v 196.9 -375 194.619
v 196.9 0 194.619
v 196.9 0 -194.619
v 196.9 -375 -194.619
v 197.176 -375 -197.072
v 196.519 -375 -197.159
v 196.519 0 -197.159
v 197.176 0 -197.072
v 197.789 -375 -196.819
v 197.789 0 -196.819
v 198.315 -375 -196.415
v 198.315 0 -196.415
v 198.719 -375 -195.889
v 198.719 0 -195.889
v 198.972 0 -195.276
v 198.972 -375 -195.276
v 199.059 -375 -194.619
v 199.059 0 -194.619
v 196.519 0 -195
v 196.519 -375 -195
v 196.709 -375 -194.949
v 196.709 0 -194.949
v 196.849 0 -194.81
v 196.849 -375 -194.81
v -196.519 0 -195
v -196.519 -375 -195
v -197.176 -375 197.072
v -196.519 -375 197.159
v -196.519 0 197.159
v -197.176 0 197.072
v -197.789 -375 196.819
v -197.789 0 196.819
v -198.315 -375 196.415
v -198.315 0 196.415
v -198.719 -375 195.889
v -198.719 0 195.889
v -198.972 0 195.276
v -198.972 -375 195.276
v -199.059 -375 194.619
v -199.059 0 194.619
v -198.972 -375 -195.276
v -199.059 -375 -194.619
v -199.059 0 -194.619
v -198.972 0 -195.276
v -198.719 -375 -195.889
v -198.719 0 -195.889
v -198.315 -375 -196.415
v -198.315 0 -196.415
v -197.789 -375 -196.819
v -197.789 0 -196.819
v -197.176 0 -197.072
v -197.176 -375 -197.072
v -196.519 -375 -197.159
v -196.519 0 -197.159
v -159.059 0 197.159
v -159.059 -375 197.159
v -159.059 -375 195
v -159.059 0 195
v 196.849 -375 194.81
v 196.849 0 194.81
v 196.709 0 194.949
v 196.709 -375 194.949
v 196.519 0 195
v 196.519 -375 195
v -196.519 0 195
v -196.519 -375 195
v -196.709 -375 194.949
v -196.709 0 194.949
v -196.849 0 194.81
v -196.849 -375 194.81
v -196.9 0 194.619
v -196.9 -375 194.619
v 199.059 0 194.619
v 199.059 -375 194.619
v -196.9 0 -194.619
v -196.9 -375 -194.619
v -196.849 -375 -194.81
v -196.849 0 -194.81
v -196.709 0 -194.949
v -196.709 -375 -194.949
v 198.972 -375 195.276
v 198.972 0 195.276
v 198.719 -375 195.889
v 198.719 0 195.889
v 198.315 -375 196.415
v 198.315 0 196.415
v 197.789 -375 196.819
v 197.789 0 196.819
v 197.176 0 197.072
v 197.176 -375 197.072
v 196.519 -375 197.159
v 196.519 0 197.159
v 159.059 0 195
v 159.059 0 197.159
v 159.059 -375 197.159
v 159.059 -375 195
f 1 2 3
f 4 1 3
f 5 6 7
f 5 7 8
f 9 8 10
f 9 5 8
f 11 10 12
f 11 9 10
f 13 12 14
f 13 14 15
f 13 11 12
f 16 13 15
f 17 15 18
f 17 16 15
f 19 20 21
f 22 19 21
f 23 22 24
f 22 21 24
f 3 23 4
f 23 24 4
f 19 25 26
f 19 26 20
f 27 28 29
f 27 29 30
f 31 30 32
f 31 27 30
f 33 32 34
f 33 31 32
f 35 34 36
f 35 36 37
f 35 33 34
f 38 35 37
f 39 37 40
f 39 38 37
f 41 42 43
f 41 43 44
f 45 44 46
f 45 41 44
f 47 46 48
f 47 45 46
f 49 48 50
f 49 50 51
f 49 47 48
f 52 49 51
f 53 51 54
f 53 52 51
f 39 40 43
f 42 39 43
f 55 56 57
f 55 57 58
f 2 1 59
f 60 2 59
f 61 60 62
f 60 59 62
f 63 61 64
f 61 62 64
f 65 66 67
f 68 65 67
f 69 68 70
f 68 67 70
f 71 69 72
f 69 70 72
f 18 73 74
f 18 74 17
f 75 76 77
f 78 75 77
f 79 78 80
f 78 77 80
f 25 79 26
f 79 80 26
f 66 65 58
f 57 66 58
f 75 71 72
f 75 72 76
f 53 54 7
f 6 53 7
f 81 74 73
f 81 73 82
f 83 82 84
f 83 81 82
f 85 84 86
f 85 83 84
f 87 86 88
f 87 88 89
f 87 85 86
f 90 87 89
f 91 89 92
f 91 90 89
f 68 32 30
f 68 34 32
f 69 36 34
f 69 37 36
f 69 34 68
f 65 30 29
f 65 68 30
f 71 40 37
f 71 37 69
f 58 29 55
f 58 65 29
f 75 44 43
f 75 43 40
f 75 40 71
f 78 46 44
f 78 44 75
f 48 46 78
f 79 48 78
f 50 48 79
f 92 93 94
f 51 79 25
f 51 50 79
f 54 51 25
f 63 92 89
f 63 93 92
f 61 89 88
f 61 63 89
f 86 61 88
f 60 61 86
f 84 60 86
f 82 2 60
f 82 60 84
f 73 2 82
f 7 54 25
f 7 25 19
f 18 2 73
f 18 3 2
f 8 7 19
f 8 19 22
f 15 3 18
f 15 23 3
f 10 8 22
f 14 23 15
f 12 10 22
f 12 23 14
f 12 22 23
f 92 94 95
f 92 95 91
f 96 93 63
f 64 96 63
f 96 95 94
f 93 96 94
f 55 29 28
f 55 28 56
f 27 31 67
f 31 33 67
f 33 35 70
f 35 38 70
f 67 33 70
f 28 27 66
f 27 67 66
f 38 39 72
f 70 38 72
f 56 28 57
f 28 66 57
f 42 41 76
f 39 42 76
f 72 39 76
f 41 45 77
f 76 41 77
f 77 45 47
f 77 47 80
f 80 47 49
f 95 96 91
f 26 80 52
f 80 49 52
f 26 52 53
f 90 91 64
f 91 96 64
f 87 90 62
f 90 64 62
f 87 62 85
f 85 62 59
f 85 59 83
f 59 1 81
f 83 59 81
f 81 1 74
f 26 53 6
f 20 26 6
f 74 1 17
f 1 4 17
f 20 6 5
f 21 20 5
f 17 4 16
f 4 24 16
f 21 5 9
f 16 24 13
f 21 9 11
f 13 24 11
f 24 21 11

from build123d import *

# Parameters (mm, degrees)
SKETCH1_W              = 398.11784
SKETCH1_H              = 394.318
SKETCH1_W_2            = 393.79984
SKETCH1_H_2            = 390
EXTRUDE_THIN1_DEPTH    = 375
CUT_EXTRUDE1_REACH     = 581.427
SKETCH2_W              = 318.11784
SKETCH2_H              = 375
CONVERT_SOLID1_START   = -375
CONVERT_SOLID1_DEPTH   = 375
CONVERT_SOLID1_2_DEPTH = 375


# Read off the part's stored shape, not the designer's step: Convert-Solid1
with BuildPart() as part:
    # Sketch1 → Extrude-Thin1 (new body)
    with BuildSketch(Plane(origin=(0, 0, 0), x_dir=(1, 0, 0), z_dir=(0, 1, 0))):
        Rectangle(SKETCH1_W, SKETCH1_H)
        Rectangle(SKETCH1_W_2, SKETCH1_H_2, mode=Mode.SUBTRACT)
    extrude(amount=-EXTRUDE_THIN1_DEPTH)

    # Sketch2 → Cut-Extrude1 (cut, up to next)
    with BuildSketch(Plane.XY.offset(197.159), mode=Mode.PRIVATE) as cut_extrude1_sk1:
        with Locations((0, -187.5)):
            Rectangle(SKETCH2_W, SKETCH2_H)
    cut_extrude1_tool1 = extrude(cut_extrude1_sk1.sketch, amount=-CUT_EXTRUDE1_REACH, mode=Mode.PRIVATE) & part.part
    add(cut_extrude1_tool1.solids().sort_by_distance((0, -187.5, 197.159))[0], mode=Mode.SUBTRACT)

    # Convert-Solid1 outline → Convert-Solid1 (cut)
    with BuildSketch(Plane(origin=(0, 0, 0), x_dir=(1, 0, 0), z_dir=(0, 1, 0)).offset(CONVERT_SOLID1_START)):
        with BuildLine():
            Line((199.05892, -197.159), (199.05892, -194.619))
            ThreePointArc((199.05892, -194.619), (198.314971224, -196.415051224), (196.51892, -197.159))
            Line((196.51892, -197.159), (199.05892, -197.159))
        make_face()
        with BuildLine():
            Line((199.05892, 197.159), (196.51892, 197.159))
            ThreePointArc((196.51892, 197.159), (198.314971224, 196.415051224), (199.05892, 194.619))
            Line((199.05892, 194.619), (199.05892, 197.159))
        make_face()
        with BuildLine():
            Line((-199.05892, 197.159), (-199.05892, 194.619))
            ThreePointArc((-199.05892, 194.619), (-198.314971224, 196.415051224), (-196.51892, 197.159))
            Line((-196.51892, 197.159), (-199.05892, 197.159))
        make_face()
        with BuildLine():
            ThreePointArc((-196.51892, -197.159), (-198.314971224, -196.415051224), (-199.05892, -194.619))
            Line((-199.05892, -194.619), (-199.05892, -197.159))
            Line((-199.05892, -197.159), (-196.51892, -197.159))
        make_face()
    extrude(amount=CONVERT_SOLID1_DEPTH, mode=Mode.SUBTRACT)

    # Convert-Solid1 2 outline → Convert-Solid1 2 (add)
    with BuildSketch(Plane(origin=(0, 0, 0), x_dir=(1, 0, 0), z_dir=(0, 1, 0)).offset(CONVERT_SOLID1_START)):
        with BuildLine():
            Line((196.89992, -195), (196.89992, -194.619))
            ThreePointArc((196.89992, -194.619), (196.788327684, -194.888407684), (196.51892, -195))
            Line((196.51892, -195), (196.89992, -195))
        make_face()
        with BuildLine():
            Line((196.89992, 195), (196.51892, 195))
            ThreePointArc((196.51892, 195), (196.788327684, 194.888407684), (196.89992, 194.619))
            Line((196.89992, 194.619), (196.89992, 195))
        make_face()
        with BuildLine():
            Line((-196.89992, 195), (-196.89992, 194.619))
            ThreePointArc((-196.89992, 194.619), (-196.788327684, 194.888407684), (-196.51892, 195))
            Line((-196.51892, 195), (-196.89992, 195))
        make_face()
        with BuildLine():
            ThreePointArc((-196.51892, -195), (-196.788327684, -194.888407684), (-196.89992, -194.619))
            Line((-196.89992, -194.619), (-196.89992, -195))
            Line((-196.89992, -195), (-196.51892, -195))
        make_face()
    extrude(amount=CONVERT_SOLID1_2_DEPTH)


solid = part.part
